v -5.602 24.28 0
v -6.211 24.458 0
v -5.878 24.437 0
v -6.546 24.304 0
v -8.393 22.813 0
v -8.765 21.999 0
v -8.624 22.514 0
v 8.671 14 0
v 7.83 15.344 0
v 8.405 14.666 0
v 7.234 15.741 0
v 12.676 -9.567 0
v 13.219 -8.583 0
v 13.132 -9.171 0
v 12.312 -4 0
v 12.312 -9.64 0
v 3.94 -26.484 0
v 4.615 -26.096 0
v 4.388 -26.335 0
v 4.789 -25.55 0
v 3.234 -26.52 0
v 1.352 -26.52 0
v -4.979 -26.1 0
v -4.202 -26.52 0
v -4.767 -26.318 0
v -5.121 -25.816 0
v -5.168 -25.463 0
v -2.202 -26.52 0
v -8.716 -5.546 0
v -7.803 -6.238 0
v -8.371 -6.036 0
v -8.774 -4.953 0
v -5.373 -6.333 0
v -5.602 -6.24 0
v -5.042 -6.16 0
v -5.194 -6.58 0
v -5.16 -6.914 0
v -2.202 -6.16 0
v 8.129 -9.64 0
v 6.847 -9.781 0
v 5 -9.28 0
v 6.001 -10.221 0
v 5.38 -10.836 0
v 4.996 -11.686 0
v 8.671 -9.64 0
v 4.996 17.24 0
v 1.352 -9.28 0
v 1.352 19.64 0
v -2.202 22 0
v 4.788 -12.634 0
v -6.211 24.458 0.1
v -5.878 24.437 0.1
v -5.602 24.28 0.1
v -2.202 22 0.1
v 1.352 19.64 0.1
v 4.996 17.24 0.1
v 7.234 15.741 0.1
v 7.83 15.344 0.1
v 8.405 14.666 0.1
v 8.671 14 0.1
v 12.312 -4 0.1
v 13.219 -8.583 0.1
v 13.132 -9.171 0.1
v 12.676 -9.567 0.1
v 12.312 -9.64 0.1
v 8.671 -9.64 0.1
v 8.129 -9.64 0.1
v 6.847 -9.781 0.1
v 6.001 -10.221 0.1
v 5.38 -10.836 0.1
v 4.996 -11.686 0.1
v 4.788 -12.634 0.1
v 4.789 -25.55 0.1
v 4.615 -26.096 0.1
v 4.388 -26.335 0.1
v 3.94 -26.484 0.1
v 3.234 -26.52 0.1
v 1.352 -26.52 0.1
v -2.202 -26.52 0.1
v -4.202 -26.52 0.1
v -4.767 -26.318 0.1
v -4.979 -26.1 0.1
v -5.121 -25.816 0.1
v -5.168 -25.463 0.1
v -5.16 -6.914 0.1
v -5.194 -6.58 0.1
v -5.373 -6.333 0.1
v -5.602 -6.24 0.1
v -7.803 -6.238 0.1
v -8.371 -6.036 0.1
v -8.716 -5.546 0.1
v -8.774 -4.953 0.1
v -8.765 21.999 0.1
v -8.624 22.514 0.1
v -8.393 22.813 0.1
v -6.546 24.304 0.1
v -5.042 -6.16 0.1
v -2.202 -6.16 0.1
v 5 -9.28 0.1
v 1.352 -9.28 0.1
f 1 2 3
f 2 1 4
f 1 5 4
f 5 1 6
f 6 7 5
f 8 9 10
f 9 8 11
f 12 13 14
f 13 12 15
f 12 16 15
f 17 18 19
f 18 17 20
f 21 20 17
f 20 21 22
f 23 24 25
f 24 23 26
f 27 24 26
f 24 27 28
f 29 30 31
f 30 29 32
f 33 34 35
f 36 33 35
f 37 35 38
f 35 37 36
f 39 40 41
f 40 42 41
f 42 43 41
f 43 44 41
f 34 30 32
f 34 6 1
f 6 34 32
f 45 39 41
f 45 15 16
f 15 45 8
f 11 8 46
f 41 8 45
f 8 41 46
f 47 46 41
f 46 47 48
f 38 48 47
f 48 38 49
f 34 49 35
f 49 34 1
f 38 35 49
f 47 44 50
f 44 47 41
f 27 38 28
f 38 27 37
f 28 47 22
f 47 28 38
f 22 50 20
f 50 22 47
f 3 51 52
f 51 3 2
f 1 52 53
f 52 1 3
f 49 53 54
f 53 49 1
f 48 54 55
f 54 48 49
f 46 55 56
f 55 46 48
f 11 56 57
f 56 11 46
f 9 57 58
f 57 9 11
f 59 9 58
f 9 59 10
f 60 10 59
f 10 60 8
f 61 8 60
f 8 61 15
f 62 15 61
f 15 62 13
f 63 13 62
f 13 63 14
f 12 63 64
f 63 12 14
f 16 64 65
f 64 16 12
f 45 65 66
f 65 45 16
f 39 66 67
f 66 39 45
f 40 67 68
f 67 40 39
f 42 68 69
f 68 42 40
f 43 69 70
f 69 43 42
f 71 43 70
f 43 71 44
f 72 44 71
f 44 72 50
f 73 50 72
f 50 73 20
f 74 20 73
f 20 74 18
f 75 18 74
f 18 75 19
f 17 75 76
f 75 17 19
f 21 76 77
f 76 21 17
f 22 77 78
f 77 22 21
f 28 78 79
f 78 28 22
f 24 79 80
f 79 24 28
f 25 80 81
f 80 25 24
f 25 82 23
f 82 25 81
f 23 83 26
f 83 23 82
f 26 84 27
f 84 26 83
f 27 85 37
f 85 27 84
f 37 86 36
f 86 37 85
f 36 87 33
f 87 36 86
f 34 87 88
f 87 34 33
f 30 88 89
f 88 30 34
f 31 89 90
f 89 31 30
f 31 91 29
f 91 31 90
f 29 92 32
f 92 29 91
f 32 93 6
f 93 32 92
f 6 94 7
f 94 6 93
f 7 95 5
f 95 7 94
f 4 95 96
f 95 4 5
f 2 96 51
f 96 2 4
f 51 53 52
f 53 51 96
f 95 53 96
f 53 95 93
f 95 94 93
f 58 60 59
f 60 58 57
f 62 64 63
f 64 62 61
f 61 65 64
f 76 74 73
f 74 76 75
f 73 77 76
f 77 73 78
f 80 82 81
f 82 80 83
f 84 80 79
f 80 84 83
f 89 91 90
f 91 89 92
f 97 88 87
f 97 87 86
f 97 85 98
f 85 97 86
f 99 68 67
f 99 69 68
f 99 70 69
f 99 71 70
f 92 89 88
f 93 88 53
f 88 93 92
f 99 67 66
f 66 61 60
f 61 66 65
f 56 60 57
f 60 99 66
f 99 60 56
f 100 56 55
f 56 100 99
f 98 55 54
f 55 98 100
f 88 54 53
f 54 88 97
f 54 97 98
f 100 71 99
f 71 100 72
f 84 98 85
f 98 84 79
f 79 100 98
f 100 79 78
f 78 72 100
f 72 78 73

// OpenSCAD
// file: ../p/4-4edge.scad
use <../lib.scad>
$fa=1; $fs=0.2;
function ldraw_lib__4_4edge(realsolid=false) = [
// 0 Circle 1.0
// 0 Name: 4-4edge.dat
// 0 Author: James Jessiman
// 0 !LDRAW_ORG Primitive UPDATE 2017-01
// 0 !LICENSE Licensed under CC BY 2.0 and CC BY 4.0 : see CAreadme.txt
// 
// 0 BFC CERTIFY CCW
  [0,"BFC","CERTIFY"],
  [0,"BFC","CCW"],
// 
// 0 !HISTORY 1998-12-15 [PTadmin] Official Update 1998-10
// 0 !HISTORY 2005-12-28 [PTadmin] Official Update 2005-01
// 0 !HISTORY 2007-06-24 [PTadmin] Header formatted for Contributor Agreement
// 0 !HISTORY 2008-07-01 [PTadmin] Official Update 2008-01
// 0 !HISTORY 2017-01-15 [Steffen] BFCed
// 0 !HISTORY 2017-12-30 [PTadmin] Official Update 2017-01
// 
// 
// 2 24 1 0 0 0.9239 0 0.3827
  [2,24,1,0,0,0.9239,0,0.3827],
// 2 24 0.9239 0 0.3827 0.7071 0 0.7071
  [2,24,0.9239,0,0.3827,0.7071,0,0.7071],
// 2 24 0.7071 0 0.7071 0.3827 0 0.9239
  [2,24,0.7071,0,0.7071,0.3827,0,0.9239],
// 2 24 0.3827 0 0.9239 0 0 1
  [2,24,0.3827,0,0.9239,0,0,1],
// 2 24 0 0 1 -0.3827 0 0.9239
  [2,24,0,0,1,-0.3827,0,0.9239],
// 2 24 -0.3827 0 0.9239 -0.7071 0 0.7071
  [2,24,-0.3827,0,0.9239,-0.7071,0,0.7071],
// 2 24 -0.7071 0 0.7071 -0.9239 0 0.3827
  [2,24,-0.7071,0,0.7071,-0.9239,0,0.3827],
// 2 24 -0.9239 0 0.3827 -1 0 -0
  [2,24,-0.9239,0,0.3827,-1,0,-0],
// 2 24 -1 0 -0 -0.9239 0 -0.3827
  [2,24,-1,0,-0,-0.9239,0,-0.3827],
// 2 24 -0.9239 0 -0.3827 -0.7071 0 -0.7071
  [2,24,-0.9239,0,-0.3827,-0.7071,0,-0.7071],
// 2 24 -0.7071 0 -0.7071 -0.3827 0 -0.9239
  [2,24,-0.7071,0,-0.7071,-0.3827,0,-0.9239],
// 2 24 -0.3827 0 -0.9239 0 0 -1
  [2,24,-0.3827,0,-0.9239,0,0,-1],
// 2 24 0 0 -1 0.3827 0 -0.9239
  [2,24,0,0,-1,0.3827,0,-0.9239],
// 2 24 0.3827 0 -0.9239 0.7071 0 -0.7071
  [2,24,0.3827,0,-0.9239,0.7071,0,-0.7071],
// 2 24 0.7071 0 -0.7071 0.9239 0 -0.3827
  [2,24,0.7071,0,-0.7071,0.9239,0,-0.3827],
// 2 24 0.9239 0 -0.3827 1 0 0
  [2,24,0.9239,0,-0.3827,1,0,0],
];
module ldraw_lib__4_4edge(step=0, col=false, unit=2/5, alt=false, line=0.2, solid=!$preview)
    makepoly(ldraw_lib__4_4edge(solid), step=step, col=col, unit=unit, alt=alt, line=line, solid=solid);
ldraw_lib__4_4edge(line=0.2);
// file: ../p/4-4disc.scad
use <../lib.scad>
$fa=1; $fs=0.2;
function ldraw_lib__4_4disc(realsolid=false) = [
// 0 Disc 1.0
// 0 Name: 4-4disc.dat
// 0 Author: James Jessiman
// 0 !LDRAW_ORG Primitive UPDATE 2002-02
// 0 !LICENSE Licensed under CC BY 2.0 and CC BY 4.0 : see CAreadme.txt
// 
// 0 BFC CERTIFY CCW
  [0,"BFC","CERTIFY"],
  [0,"BFC","CCW"],
// 
// 0 !HISTORY 1998-12-15 [PTadmin] Official Update 1998-10
// 0 !HISTORY 2002-03-23 [sbliss] Added BFC statement
// 0 !HISTORY 2002-04-25 [PTadmin] Official Update 2002-02
// 0 !HISTORY 2007-06-24 [PTadmin] Header formatted for Contributor Agreement
// 0 !HISTORY 2008-07-01 [PTadmin] Official Update 2008-01
// 
// 
// 3 16 0 0 0 1 0 0 0.9239 0 0.3827
  [3,16,0,0,0,1,0,0,0.9239,0,0.3827],
// 3 16 0 0 0 0.9239 0 0.3827 0.7071 0 0.7071
  [3,16,0,0,0,0.9239,0,0.3827,0.7071,0,0.7071],
// 3 16 0 0 0 0.7071 0 0.7071 0.3827 0 0.9239
  [3,16,0,0,0,0.7071,0,0.7071,0.3827,0,0.9239],
// 3 16 0 0 0 0.3827 0 0.9239 0 0 1
  [3,16,0,0,0,0.3827,0,0.9239,0,0,1],
// 3 16 0 0 0 0 0 1 -0.3827 0 0.9239
  [3,16,0,0,0,0,0,1,-0.3827,0,0.9239],
// 3 16 0 0 0 -0.3827 0 0.9239 -0.7071 0 0.7071
  [3,16,0,0,0,-0.3827,0,0.9239,-0.7071,0,0.7071],
// 3 16 0 0 0 -0.7071 0 0.7071 -0.9239 0 0.3827
  [3,16,0,0,0,-0.7071,0,0.7071,-0.9239,0,0.3827],
// 3 16 0 0 0 -0.9239 0 0.3827 -1 0 -0
  [3,16,0,0,0,-0.9239,0,0.3827,-1,0,-0],
// 3 16 0 0 0 -1 0 -0 -0.9239 0 -0.3827
  [3,16,0,0,0,-1,0,-0,-0.9239,0,-0.3827],
// 3 16 0 0 0 -0.9239 0 -0.3827 -0.7071 0 -0.7071
  [3,16,0,0,0,-0.9239,0,-0.3827,-0.7071,0,-0.7071],
// 3 16 0 0 0 -0.7071 0 -0.7071 -0.3827 0 -0.9239
  [3,16,0,0,0,-0.7071,0,-0.7071,-0.3827,0,-0.9239],
// 3 16 0 0 0 -0.3827 0 -0.9239 0 0 -1
  [3,16,0,0,0,-0.3827,0,-0.9239,0,0,-1],
// 3 16 0 0 0 0 0 -1 0.3827 0 -0.9239
  [3,16,0,0,0,0,0,-1,0.3827,0,-0.9239],
// 3 16 0 0 0 0.3827 0 -0.9239 0.7071 0 -0.7071
  [3,16,0,0,0,0.3827,0,-0.9239,0.7071,0,-0.7071],
// 3 16 0 0 0 0.7071 0 -0.7071 0.9239 0 -0.3827
  [3,16,0,0,0,0.7071,0,-0.7071,0.9239,0,-0.3827],
// 3 16 0 0 0 0.9239 0 -0.3827 1 0 0
  [3,16,0,0,0,0.9239,0,-0.3827,1,0,0],
// 0
];
module ldraw_lib__4_4disc(step=0, col=false, unit=2/5, alt=false, line=0.2, solid=!$preview)
    makepoly(ldraw_lib__4_4disc(solid), step=step, col=col, unit=unit, alt=alt, line=line, solid=solid);
ldraw_lib__4_4disc(line=0.2);
// file: ../p/4-4cyli.scad
use <../lib.scad>
$fa=1; $fs=0.2;
function ldraw_lib__4_4cyli(realsolid=false) = [
// 0 Cylinder 1.0
// 0 Name: 4-4cyli.dat
// 0 Author: James Jessiman
// 0 !LDRAW_ORG Primitive UPDATE 2005-01
// 0 !LICENSE Licensed under CC BY 2.0 and CC BY 4.0 : see CAreadme.txt
// 
// 0 BFC CERTIFY CCW
  [0,"BFC","CERTIFY"],
  [0,"BFC","CCW"],
// 
// 0 !HISTORY 1998-12-15 [PTadmin] Official Update 1998-10
// 0 !HISTORY 2002-03-23 [sbliss] Added BFC statement; merged headers from files in distributions LDraw 0.27 and Complete.
// 0 !HISTORY 2002-04-25 [PTadmin] Official Update 2002-02
// 0 !HISTORY 2004-12-14 [guyvivan] BFC CCW
// 0 !HISTORY 2005-12-28 [PTadmin] Official Update 2005-01
// 0 !HISTORY 2007-06-24 [PTadmin] Header formatted for Contributor Agreement
// 0 !HISTORY 2008-07-01 [PTadmin] Official Update 2008-01
// 
// 
// 4 16 1 1 0 0.9239 1 0.3827 0.9239 0 0.3827 1 0 0
  [4,16,1,1,0,0.9239,1,0.3827,0.9239,0,0.3827,1,0,0],
// 5 24 1 0 0 1 1 0 0.9239 0 0.3827 0.9239 0 -0.3827
  [5,24,1,0,0,1,1,0,0.9239,0,0.3827,0.9239,0,-0.3827],
// 4 16 0.9239 1 0.3827 0.7071 1 0.7071 0.7071 0 0.7071 0.9239 0 0.3827
  [4,16,0.9239,1,0.3827,0.7071,1,0.7071,0.7071,0,0.7071,0.9239,0,0.3827],
// 5 24 0.9239 0 0.3827 0.9239 1 0.3827 0.7071 0 0.7071 1 0 0
  [5,24,0.9239,0,0.3827,0.9239,1,0.3827,0.7071,0,0.7071,1,0,0],
// 4 16 0.7071 1 0.7071 0.3827 1 0.9239 0.3827 0 0.9239 0.7071 0 0.7071
  [4,16,0.7071,1,0.7071,0.3827,1,0.9239,0.3827,0,0.9239,0.7071,0,0.7071],
// 5 24 0.7071 0 0.7071 0.7071 1 0.7071 0.3827 0 0.9239 0.9239 0 0.3827
  [5,24,0.7071,0,0.7071,0.7071,1,0.7071,0.3827,0,0.9239,0.9239,0,0.3827],
// 4 16 0.3827 1 0.9239 0 1 1 0 0 1 0.3827 0 0.9239
  [4,16,0.3827,1,0.9239,0,1,1,0,0,1,0.3827,0,0.9239],
// 5 24 0.3827 0 0.9239 0.3827 1 0.9239 0 0 1 0.7071 0 0.7071
  [5,24,0.3827,0,0.9239,0.3827,1,0.9239,0,0,1,0.7071,0,0.7071],
// 4 16 0 1 1 -0.3827 1 0.9239 -0.3827 0 0.9239 0 0 1
  [4,16,0,1,1,-0.3827,1,0.9239,-0.3827,0,0.9239,0,0,1],
// 5 24 0 0 1 0 1 1 -0.3827 0 0.9239 0.3827 0 0.9239
  [5,24,0,0,1,0,1,1,-0.3827,0,0.9239,0.3827,0,0.9239],
// 4 16 -0.3827 1 0.9239 -0.7071 1 0.7071 -0.7071 0 0.7071 -0.3827 0 0.9239
  [4,16,-0.3827,1,0.9239,-0.7071,1,0.7071,-0.7071,0,0.7071,-0.3827,0,0.9239],
// 5 24 -0.3827 0 0.9239 -0.3827 1 0.9239 -0.7071 0 0.7071 0 0 1
  [5,24,-0.3827,0,0.9239,-0.3827,1,0.9239,-0.7071,0,0.7071,0,0,1],
// 4 16 -0.7071 1 0.7071 -0.9239 1 0.3827 -0.9239 0 0.3827 -0.7071 0 0.7071
  [4,16,-0.7071,1,0.7071,-0.9239,1,0.3827,-0.9239,0,0.3827,-0.7071,0,0.7071],
// 5 24 -0.7071 0 0.7071 -0.7071 1 0.7071 -0.9239 0 0.3827 -0.3827 0 0.9239
  [5,24,-0.7071,0,0.7071,-0.7071,1,0.7071,-0.9239,0,0.3827,-0.3827,0,0.9239],
// 4 16 -0.9239 1 0.3827 -1 1 0 -1 0 0 -0.9239 0 0.3827
  [4,16,-0.9239,1,0.3827,-1,1,0,-1,0,0,-0.9239,0,0.3827],
// 5 24 -0.9239 0 0.3827 -0.9239 1 0.3827 -1 0 0 -0.7071 0 0.7071
  [5,24,-0.9239,0,0.3827,-0.9239,1,0.3827,-1,0,0,-0.7071,0,0.7071],
// 4 16 -1 1 0 -0.9239 1 -0.3827 -0.9239 0 -0.3827 -1 0 0
  [4,16,-1,1,0,-0.9239,1,-0.3827,-0.9239,0,-0.3827,-1,0,0],
// 5 24 -1 0 0 -1 1 0 -0.9239 0 -0.3827 -0.9239 0 0.3827
  [5,24,-1,0,0,-1,1,0,-0.9239,0,-0.3827,-0.9239,0,0.3827],
// 4 16 -0.9239 1 -0.3827 -0.7071 1 -0.7071 -0.7071 0 -0.7071 -0.9239 0 -0.3827
  [4,16,-0.9239,1,-0.3827,-0.7071,1,-0.7071,-0.7071,0,-0.7071,-0.9239,0,-0.3827],
// 5 24 -0.9239 0 -0.3827 -0.9239 1 -0.3827 -0.7071 0 -0.7071 -1 0 0
  [5,24,-0.9239,0,-0.3827,-0.9239,1,-0.3827,-0.7071,0,-0.7071,-1,0,0],
// 4 16 -0.7071 1 -0.7071 -0.3827 1 -0.9239 -0.3827 0 -0.9239 -0.7071 0 -0.7071
  [4,16,-0.7071,1,-0.7071,-0.3827,1,-0.9239,-0.3827,0,-0.9239,-0.7071,0,-0.7071],
// 5 24 -0.7071 0 -0.7071 -0.7071 1 -0.7071 -0.3827 0 -0.9239 -0.9239 0 -0.3827
  [5,24,-0.7071,0,-0.7071,-0.7071,1,-0.7071,-0.3827,0,-0.9239,-0.9239,0,-0.3827],
// 4 16 -0.3827 1 -0.9239 0 1 -1 0 0 -1 -0.3827 0 -0.9239
  [4,16,-0.3827,1,-0.9239,0,1,-1,0,0,-1,-0.3827,0,-0.9239],
// 5 24 -0.3827 0 -0.9239 -0.3827 1 -0.9239 0 0 -1 -0.7071 0 -0.7071
  [5,24,-0.3827,0,-0.9239,-0.3827,1,-0.9239,0,0,-1,-0.7071,0,-0.7071],
// 4 16 0 1 -1 0.3827 1 -0.9239 0.3827 0 -0.9239 0 0 -1
  [4,16,0,1,-1,0.3827,1,-0.9239,0.3827,0,-0.9239,0,0,-1],
// 5 24 0 0 -1 0 1 -1 0.3827 0 -0.9239 -0.3827 0 -0.9239
  [5,24,0,0,-1,0,1,-1,0.3827,0,-0.9239,-0.3827,0,-0.9239],
// 4 16 0.3827 1 -0.9239 0.7071 1 -0.7071 0.7071 0 -0.7071 0.3827 0 -0.9239
  [4,16,0.3827,1,-0.9239,0.7071,1,-0.7071,0.7071,0,-0.7071,0.3827,0,-0.9239],
// 5 24 0.3827 0 -0.9239 0.3827 1 -0.9239 0.7071 0 -0.7071 0 0 -1
  [5,24,0.3827,0,-0.9239,0.3827,1,-0.9239,0.7071,0,-0.7071,0,0,-1],
// 4 16 0.7071 1 -0.7071 0.9239 1 -0.3827 0.9239 0 -0.3827 0.7071 0 -0.7071
  [4,16,0.7071,1,-0.7071,0.9239,1,-0.3827,0.9239,0,-0.3827,0.7071,0,-0.7071],
// 5 24 0.7071 0 -0.7071 0.7071 1 -0.7071 0.9239 0 -0.3827 0.3827 0 -0.9239
  [5,24,0.7071,0,-0.7071,0.7071,1,-0.7071,0.9239,0,-0.3827,0.3827,0,-0.9239],
// 4 16 0.9239 1 -0.3827 1 1 0 1 0 0 0.9239 0 -0.3827
  [4,16,0.9239,1,-0.3827,1,1,0,1,0,0,0.9239,0,-0.3827],
// 5 24 0.9239 0 -0.3827 0.9239 1 -0.3827 1 0 0 0.7071 0 -0.7071
  [5,24,0.9239,0,-0.3827,0.9239,1,-0.3827,1,0,0,0.7071,0,-0.7071],
// 0
];
module ldraw_lib__4_4cyli(step=0, col=false, unit=2/5, alt=false, line=0.2, solid=!$preview)
    makepoly(ldraw_lib__4_4cyli(solid), step=step, col=col, unit=unit, alt=alt, line=line, solid=solid);
ldraw_lib__4_4cyli(line=0.2);
// file: ../p/stud3.scad
use <../lib.scad>
use <4-4cyli.scad>
use <4-4disc.scad>
use <4-4edge.scad>
$fa=1; $fs=0.2;
function ldraw_lib__stud3(realsolid=false) = realsolid ? 
    [openscad(translate([0,0,-eps()], o=cylinder(4+eps(), r=4)),2)] : [
// 0 Stud Tube Solid
// 0 Name: stud3.dat
// 0 Author: James Jessiman
// 0 !LDRAW_ORG Primitive UPDATE 2012-01
// 0 !LICENSE Licensed under CC BY 2.0 and CC BY 4.0 : see CAreadme.txt
// 
// 0 BFC CERTIFY CCW
  [0,"BFC","CERTIFY"],
  [0,"BFC","CCW"],
// 
// 0 !HISTORY 2002-04-04 [sbliss] Modified for BFC compliance
// 0 !HISTORY 2002-04-25 [PTadmin] Official Update 2002-02
// 0 !HISTORY 2007-06-24 [PTadmin] Header formatted for Contributor Agreement
// 0 !HISTORY 2008-07-01 [PTadmin] Official Update 2008-01
// 0 !HISTORY 2012-02-16 [Philo] Changed to CCW
// 0 !HISTORY 2012-03-30 [PTadmin] Official Update 2012-01
// 
// 
// 1 16 0 -4 0 4 0 0 0 1 0 0 0 4 4-4edge.dat
  [1,16,0,-4,0,4,0,0,0,1,0,0,0,4, ldraw_lib__4_4edge(realsolid)],
// 1 16 0 0 0 4 0 0 0 1 0 0 0 4 4-4edge.dat
  [1,16,0,0,0,4,0,0,0,1,0,0,0,4, ldraw_lib__4_4edge(realsolid)],
// 1 16 0 -4 0 4 0 0 0 1 0 0 0 4 4-4disc.dat
  [1,16,0,-4,0,4,0,0,0,1,0,0,0,4, ldraw_lib__4_4disc(realsolid)],
// 1 16 0 -4 0 4 0 0 0 4 0 0 0 4 4-4cyli.dat
  [1,16,0,-4,0,4,0,0,0,4,0,0,0,4, ldraw_lib__4_4cyli(realsolid)],
];
module ldraw_lib__stud3(step=0, col=false, unit=2/5, alt=false, line=0.2, solid=!$preview)
    makepoly(ldraw_lib__stud3(solid), step=step, col=col, unit=unit, alt=alt, line=line, solid=solid);
ldraw_lib__stud3(line=0.2);
// file: ../p/stud.scad
use <../lib.scad>
use <4-4cyli.scad>
use <4-4disc.scad>
use <4-4edge.scad>
$fa=1; $fs=0.2;
function ldraw_lib__stud(realsolid=false) = realsolid ? 
    [openscad(translate([0,0,-eps()], o=cylinder(4+eps(), r=6)),2)] : [
// 0 Stud
// 0 Name: stud.dat
// 0 Author: James Jessiman
// 0 !LDRAW_ORG Primitive UPDATE 2012-01
// 0 !LICENSE Licensed under CC BY 2.0 and CC BY 4.0 : see CAreadme.txt
// 
// 0 BFC CERTIFY CCW
  [0,"BFC","CERTIFY"],
  [0,"BFC","CCW"],
// 
// 0 !HISTORY 2002-04-04 [sbliss] Modified for BFC compliance
// 0 !HISTORY 2002-04-25 [PTadmin] Official Update 2002-02
// 0 !HISTORY 2007-06-24 [PTadmin] Header formatted for Contributor Agreement
// 0 !HISTORY 2008-07-01 [PTadmin] Official Update 2008-01
// 0 !HISTORY 2012-02-16 [Philo] Changed to CCW
// 0 !HISTORY 2012-03-30 [PTadmin] Official Update 2012-01
// 
// 
// 1 16 0 0 0 6 0 0 0 1 0 0 0 6 4-4edge.dat
  [1,16,0,0,0,6,0,0,0,1,0,0,0,6, ldraw_lib__4_4edge(realsolid)],
// 1 16 0 -4 0 6 0 0 0 1 0 0 0 6 4-4edge.dat
  [1,16,0,-4,0,6,0,0,0,1,0,0,0,6, ldraw_lib__4_4edge(realsolid)],
// 1 16 0 0 0 6 0 0 0 -4 0 0 0 6 4-4cyli.dat
  [1,16,0,0,0,6,0,0,0,-4,0,0,0,6, ldraw_lib__4_4cyli(realsolid)],
// 1 16 0 -4 0 6 0 0 0 1 0 0 0 6 4-4disc.dat
  [1,16,0,-4,0,6,0,0,0,1,0,0,0,6, ldraw_lib__4_4disc(realsolid)],
];
module ldraw_lib__stud(step=0, col=false, unit=2/5, alt=false, line=0.2, solid=!$preview)
    makepoly(ldraw_lib__stud(solid), step=step, col=col, unit=unit, alt=alt, line=line, solid=solid);
ldraw_lib__stud(line=0.2);
// file: ../p/box5.scad
use <../lib.scad>
$fa=1; $fs=0.2;
function ldraw_lib__box5(realsolid=false) = [
// 0 Box with 5 Faces and All Edges
// 0 Name: box5.dat
// 0 Author: James Jessiman
// 0 !LDRAW_ORG Primitive UPDATE 2012-01
// 0 !LICENSE Licensed under CC BY 2.0 and CC BY 4.0 : see CAreadme.txt
// 
// 0 BFC CERTIFY CCW
  [0,"BFC","CERTIFY"],
  [0,"BFC","CCW"],
// 
// 0 !HISTORY 2002-04-03 [sbliss] Modified for BFC compliance
// 0 !HISTORY 2002-04-25 [PTadmin] Official Update 2002-02
// 0 !HISTORY 2007-06-24 [PTadmin] Header formatted for Contributor Agreement
// 0 !HISTORY 2008-07-01 [PTadmin] Official Update 2008-01
// 0 !HISTORY 2012-02-16 [Philo] Changed to CCW
// 0 !HISTORY 2012-03-30 [PTadmin] Official Update 2012-01
// 
// 
// 2 24 1 1 1 -1 1 1
  [2,24,1,1,1,-1,1,1],
// 2 24 -1 1 1 -1 1 -1
  [2,24,-1,1,1,-1,1,-1],
// 2 24 -1 1 -1 1 1 -1
  [2,24,-1,1,-1,1,1,-1],
// 2 24 1 1 -1 1 1 1
  [2,24,1,1,-1,1,1,1],
// 2 24 1 0 1 -1 0 1
  [2,24,1,0,1,-1,0,1],
// 2 24 -1 0 1 -1 0 -1
  [2,24,-1,0,1,-1,0,-1],
// 2 24 -1 0 -1 1 0 -1
  [2,24,-1,0,-1,1,0,-1],
// 2 24 1 0 -1 1 0 1
  [2,24,1,0,-1,1,0,1],
// 2 24 1 0 1 1 1 1
  [2,24,1,0,1,1,1,1],
// 2 24 -1 0 1 -1 1 1
  [2,24,-1,0,1,-1,1,1],
// 2 24 1 0 -1 1 1 -1
  [2,24,1,0,-1,1,1,-1],
// 2 24 -1 0 -1 -1 1 -1
  [2,24,-1,0,-1,-1,1,-1],
// 4 16 -1 1 1 1 1 1 1 1 -1 -1 1 -1
  [4,16,-1,1,1,1,1,1,1,1,-1,-1,1,-1],
// 4 16 -1 1 1 -1 0 1 1 0 1 1 1 1
  [4,16,-1,1,1,-1,0,1,1,0,1,1,1,1],
// 4 16 -1 1 -1 -1 0 -1 -1 0 1 -1 1 1
  [4,16,-1,1,-1,-1,0,-1,-1,0,1,-1,1,1],
// 4 16 1 1 -1 1 0 -1 -1 0 -1 -1 1 -1
  [4,16,1,1,-1,1,0,-1,-1,0,-1,-1,1,-1],
// 4 16 1 1 1 1 0 1 1 0 -1 1 1 -1
  [4,16,1,1,1,1,0,1,1,0,-1,1,1,-1],
];
module ldraw_lib__box5(step=0, col=false, unit=2/5, alt=false, line=0.2, solid=!$preview)
    makepoly(ldraw_lib__box5(solid), step=step, col=col, unit=unit, alt=alt, line=line, solid=solid);
ldraw_lib__box5(line=0.2);
// file: ../p/box4t.scad
use <../lib.scad>
$fa=1; $fs=0.2;
function ldraw_lib__box4t(realsolid=false) = [
// 0 Box with 4 Adjacent Faces and All Edges
// 0 Name: box4t.dat
// 0 Author: Tore Eriksson [Tore_Eriksson]
// 0 !LDRAW_ORG Primitive UPDATE 2003-02
// 0 !LICENSE Licensed under CC BY 2.0 and CC BY 4.0 : see CAreadme.txt
// 
// 0 BFC CERTIFY CCW
  [0,"BFC","CERTIFY"],
  [0,"BFC","CCW"],
// 
// 0 !HISTORY 1997-09-29 [PTadmin] Official Update 1997-15
// 0 !HISTORY 2002-08-31 [izanette] Modified with WINDZ for BFC compliance
// 0 !HISTORY 2003-08-01 [PTadmin] Official Update 2003-02
// 0 !HISTORY 2007-06-24 [PTadmin] Header formatted for Contributor Agreement
// 0 !HISTORY 2008-07-01 [PTadmin] Official Update 2008-01
// 
// 
// 2 24 1 1 1 -1 1 1
  [2,24,1,1,1,-1,1,1],
// 2 24 -1 1 1 -1 1 -1
  [2,24,-1,1,1,-1,1,-1],
// 2 24 -1 1 -1 1 1 -1
  [2,24,-1,1,-1,1,1,-1],
// 2 24 1 1 -1 1 1 1
  [2,24,1,1,-1,1,1,1],
// 2 24 1 0 1 -1 0 1
  [2,24,1,0,1,-1,0,1],
// 2 24 -1 0 1 -1 0 -1
  [2,24,-1,0,1,-1,0,-1],
// 2 24 -1 0 -1 1 0 -1
  [2,24,-1,0,-1,1,0,-1],
// 2 24 1 0 -1 1 0 1
  [2,24,1,0,-1,1,0,1],
// 2 24 1 0 1 1 1 1
  [2,24,1,0,1,1,1,1],
// 2 24 -1 0 1 -1 1 1
  [2,24,-1,0,1,-1,1,1],
// 2 24 1 0 -1 1 1 -1
  [2,24,1,0,-1,1,1,-1],
// 2 24 -1 0 -1 -1 1 -1
  [2,24,-1,0,-1,-1,1,-1],
// 4 16 1 1 1 1 1 -1 -1 1 -1 -1 1 1
  [4,16,1,1,1,1,1,-1,-1,1,-1,-1,1,1],
// 4 16 1 1 1 -1 1 1 -1 0 1 1 0 1
  [4,16,1,1,1,-1,1,1,-1,0,1,1,0,1],
// 4 16 -1 1 1 -1 1 -1 -1 0 -1 -1 0 1
  [4,16,-1,1,1,-1,1,-1,-1,0,-1,-1,0,1],
// 0 4 16 -1 1 -1 -1 0 -1 1 0 -1 1 1 -1
// 4 16 1 1 -1 1 1 1 1 0 1 1 0 -1
  [4,16,1,1,-1,1,1,1,1,0,1,1,0,-1],
// 0
];
module ldraw_lib__box4t(step=0, col=false, unit=2/5, alt=false, line=0.2, solid=!$preview)
    makepoly(ldraw_lib__box4t(solid), step=step, col=col, unit=unit, alt=alt, line=line, solid=solid);
ldraw_lib__box4t(line=0.2);
// file: s/3004s01.scad
use <../../lib.scad>
use <../../p/box4t.scad>
use <../../p/box5.scad>
use <../../p/stud.scad>
use <../../p/stud3.scad>
$fa=1; $fs=0.2;
function ldraw_lib__s__3004s01(realsolid=false) = [
// 0 ~Brick  1 x  2 without Front Face
// 0 Name: s\3004s01.dat
// 0 Author: James Jessiman
// 0 !LDRAW_ORG Subpart UPDATE 2003-03
// 0 !LICENSE Licensed under CC BY 2.0 and CC BY 4.0 : see CAreadme.txt
// 
// 0 BFC CERTIFY CCW
  [0,"BFC","CERTIFY"],
  [0,"BFC","CCW"],
// 
// 0 !HISTORY 2003-09-07 [jriley] Subfiling, BFC
// 0 !HISTORY 2003-12-19 [PTadmin] Official Update 2003-03
// 0 !HISTORY 2007-08-29 [PTadmin] Header formatted for Contributor Agreement
// 0 !HISTORY 2008-07-01 [PTadmin] Official Update 2008-01
// 
// 
// 1 16 0 4 0 1 0 0 0 -5 0 0 0 1 stud3.dat
  [1,16,0,4,0,1,0,0,0,-5,0,0,0,1, ldraw_lib__stud3(realsolid)],
// 0 BFC INVERTNEXT
  [0,"BFC","INVERTNEXT"],
// 1 16 0 24 0 16 0 0 0 -20 0 0 0 6 box5.dat
  [1,16,0,24,0,16,0,0,0,-20,0,0,0,6, ldraw_lib__box5(realsolid)],
// 4 16 20 24 10 16 24 6 -16 24 6 -20 24 10
  [4,16,20,24,10,16,24,6,-16,24,6,-20,24,10],
// 4 16 -20 24 10 -16 24 6 -16 24 -6 -20 24 -10
  [4,16,-20,24,10,-16,24,6,-16,24,-6,-20,24,-10],
// 4 16 -20 24 -10 -16 24 -6 16 24 -6 20 24 -10
  [4,16,-20,24,-10,-16,24,-6,16,24,-6,20,24,-10],
// 4 16 20 24 -10 16 24 -6 16 24 6 20 24 10
  [4,16,20,24,-10,16,24,-6,16,24,6,20,24,10],
// 1 16 0 24 0 20 0 0 0 -24 0 0 0 10 box4t.dat
  [1,16,0,24,0,20,0,0,0,-24,0,0,0,10, ldraw_lib__box4t(realsolid)],
// 1 16 10 0 0 1 0 0 0 1 0 0 0 1 stud.dat
  [1,16,10,0,0,1,0,0,0,1,0,0,0,1, ldraw_lib__stud(realsolid)],
// 1 16 -10 0 0 1 0 0 0 1 0 0 0 1 stud.dat
  [1,16,-10,0,0,1,0,0,0,1,0,0,0,1, ldraw_lib__stud(realsolid)],
// 0
];
module ldraw_lib__s__3004s01(step=0, col=false, unit=2/5, alt=false, line=0.2, solid=!$preview)
    makepoly(ldraw_lib__s__3004s01(solid), step=step, col=col, unit=unit, alt=alt, line=line, solid=solid);
ldraw_lib__s__3004s01(line=0.2);
// file: 3004.scad
use <../lib.scad>
use <s/3004s01.scad>
$fa=1; $fs=0.2;
function ldraw_lib__3004(realsolid=false) = [
// 0 Brick  1 x  2
// 0 Name: 3004.dat
// 0 Author: James Jessiman
// 0 !LDRAW_ORG Part UPDATE 2022-05
// 0 !LICENSE Licensed under CC BY 2.0 and CC BY 4.0 : see CAreadme.txt
// 
// 0 BFC CERTIFY CCW
  [0,"BFC","CERTIFY"],
  [0,"BFC","CCW"],
// 
// 0 !HISTORY 2001-10-26 [PTadmin] Official Update 2001-01
// 0 !HISTORY 2002-05-07 {unknown} BFC Certification
// 0 !HISTORY 2002-06-11 [PTadmin] Official Update 2002-03
// 0 !HISTORY 2007-05-07 [PTadmin] Header formatted for Contributor Agreement
// 0 !HISTORY 2008-07-01 [PTadmin] Official Update 2008-01
// 0 !HISTORY 2022-08-04 [MagFors] Using subfile
// 0 !HISTORY 2022-09-15 [PTadmin] Official Update 2022-05
// 
// 
// 1 16 0 0 0 1 0 0 0 1 0 0 0 1 s\3004s01.dat
  [1,16,0,0,0,1,0,0,0,1,0,0,0,1, ldraw_lib__s__3004s01(realsolid)],
// 4 16 -20 24 -10 20 24 -10 20 0 -10 -20 0 -10
  [4,16,-20,24,-10,20,24,-10,20,0,-10,-20,0,-10],
];
module ldraw_lib__3004(step=0, col=false, unit=2/5, alt=false, line=0.2, solid=!$preview)
    makepoly(ldraw_lib__3004(solid), step=step, col=col, unit=unit, alt=alt, line=line, solid=solid);
ldraw_lib__3004(line=0.2);
// file: s/13710as02.scad
use <../../lib.scad>
$fa=1; $fs=0.2;
function ldraw_lib__s__13710as02(realsolid=false) = [
// 0 ~Sticker Top for Technic Panel Fairing Smooth (Medium) Flat
// 0 Name: s\13710as02.dat
// 0 Author: Philippe Hurbain [Philo]
// 0 !LDRAW_ORG Subpart UPDATE 2022-02
// 0 !LICENSE Licensed under CC BY 2.0 and CC BY 4.0 : see CAreadme.txt
// 
// 0 BFC CERTIFY CCW
  [0,"BFC","CERTIFY"],
  [0,"BFC","CCW"],
// 
// 0 !HISTORY 2022-03-06 [PTadmin] Official Update 2022-02
// 
// 
// 0 // Top surface
// 4 16 16.364 -0.25 60.759 15.527 -0.25 61.145 14.695 -0.25 61.093 14.004 -0.25 60.7
  [4,16,16.364,-0.25,60.759,15.527,-0.25,61.145,14.695,-0.25,61.093,14.004,-0.25,60.7],
// 4 16 21.912 -0.25 54.998 20.983 -0.25 57.032 16.364 -0.25 60.759 14.004 -0.25 60.7
  [4,16,21.912,-0.25,54.998,20.983,-0.25,57.032,16.364,-0.25,60.759,14.004,-0.25,60.7],
// 3 16 21.912 -0.25 54.998 21.561 -0.25 56.284 20.983 -0.25 57.032
  [3,16,21.912,-0.25,54.998,21.561,-0.25,56.284,20.983,-0.25,57.032],
// 4 16 -18.084 -0.25 39.353 -19.575 -0.25 38.36 -21.013 -0.25 36.664 -21.677 -0.25 35
  [4,16,-18.084,-0.25,39.353,-19.575,-0.25,38.36,-21.013,-0.25,36.664,-21.677,-0.25,35],
// 4 16 -31.689 -0.25 -23.918 -30.78 -0.25 -10 -33.048 -0.25 -21.458 -32.83 -0.25 -22.928
  [4,16,-31.689,-0.25,-23.918,-30.78,-0.25,-10,-33.048,-0.25,-21.458,-32.83,-0.25,-22.928],
// 3 16 -31.689 -0.25 -23.918 -30.78 -0.25 -24.1 -30.78 -0.25 -10
  [3,16,-31.689,-0.25,-23.918,-30.78,-0.25,-24.1,-30.78,-0.25,-10],
// 4 16 -9.849 -0.25 -66.209 -11.972 -0.25 -63.874 -11.537 -0.25 -65.239 -10.971 -0.25 -65.837
  [4,16,-9.849,-0.25,-66.209,-11.972,-0.25,-63.874,-11.537,-0.25,-65.239,-10.971,-0.25,-65.837],
// 4 16 -3.379 -0.25 -66.3 -11.972 -0.25 -63.874 -9.849 -0.25 -66.209 -8.084 -0.25 -66.3
  [4,16,-3.379,-0.25,-66.3,-11.972,-0.25,-63.874,-9.849,-0.25,-66.209,-8.084,-0.25,-66.3],
// 4 16 12.802 -0.25 -64.539 10.504 -0.25 -66.3 11.917 -0.25 -65.795 12.448 -0.25 -65.249
  [4,16,12.802,-0.25,-64.539,10.504,-0.25,-66.3,11.917,-0.25,-65.795,12.448,-0.25,-65.249],
// 4 16 5.504 -0.25 -66.3 10.504 -0.25 -66.3 12.802 -0.25 -64.539 12.92 -0.25 -63.658
  [4,16,5.504,-0.25,-66.3,10.504,-0.25,-66.3,12.802,-0.25,-64.539,12.92,-0.25,-63.658],
// 4 16 19.507 -0.25 -15.595 20.928 -0.25 -15.089 21.79 -0.25 -13.866 21.935 -0.25 -12.382
  [4,16,19.507,-0.25,-15.595,20.928,-0.25,-15.089,21.79,-0.25,-13.866,21.935,-0.25,-12.382],
// 3 16 13.432 -0.25 -15.832 14.004 -0.25 -15.6 12.604 -0.25 -15.4
  [3,16,13.432,-0.25,-15.832,14.004,-0.25,-15.6,12.604,-0.25,-15.4],
// 3 16 12.984 -0.25 -16.45 13.432 -0.25 -15.832 12.604 -0.25 -15.4
  [3,16,12.984,-0.25,-16.45,13.432,-0.25,-15.832,12.604,-0.25,-15.4],
// 4 16 5.504 -0.25 -15.4 12.899 -0.25 -17.286 12.984 -0.25 -16.45 12.604 -0.25 -15.4
  [4,16,5.504,-0.25,-15.4,12.899,-0.25,-17.286,12.984,-0.25,-16.45,12.604,-0.25,-15.4],
// 3 16 -20.323 -0.25 -24.1 -17.118 -0.25 -24.453 -12.5 -0.25 -23.2
  [3,16,-20.323,-0.25,-24.1,-17.118,-0.25,-24.453,-12.5,-0.25,-23.2],
// 3 16 -17.118 -0.25 -24.453 -15.003 -0.25 -25.552 -12.5 -0.25 -23.2
  [3,16,-17.118,-0.25,-24.453,-15.003,-0.25,-25.552,-12.5,-0.25,-23.2],
// 3 16 -15.003 -0.25 -25.552 -13.45 -0.25 -27.089 -12.5 -0.25 -23.2
  [3,16,-15.003,-0.25,-25.552,-13.45,-0.25,-27.089,-12.5,-0.25,-23.2],
// 3 16 -13.45 -0.25 -27.089 -12.491 -0.25 -29.214 -12.5 -0.25 -23.2
  [3,16,-13.45,-0.25,-27.089,-12.491,-0.25,-29.214,-12.5,-0.25,-23.2],
// 3 16 14.004 -0.25 -15.6 19.507 -0.25 -15.595 21.935 -0.25 -12.382
  [3,16,14.004,-0.25,-15.6,19.507,-0.25,-15.595,21.935,-0.25,-12.382],
// 4 16 14.004 -0.25 60.7 14.004 -0.25 -15.6 21.935 -0.25 -12.382 21.912 -0.25 54.998
  [4,16,14.004,-0.25,60.7,14.004,-0.25,-15.6,21.935,-0.25,-12.382,21.912,-0.25,54.998],
// 3 16 -21.677 -0.25 -24.1 -20.323 -0.25 -24.1 -12.5 -0.25 -23.2
  [3,16,-21.677,-0.25,-24.1,-20.323,-0.25,-24.1,-12.5,-0.25,-23.2],
// 4 16 -30.78 -0.25 -24.1 -21.677 -0.25 -24.1 -21.677 -0.25 35 -30.78 -0.25 -10
  [4,16,-30.78,-0.25,-24.1,-21.677,-0.25,-24.1,-21.677,-0.25,35,-30.78,-0.25,-10],
// 3 16 -18.084 -0.25 39.353 -21.677 -0.25 35 -12.491 -0.25 43.1
  [3,16,-18.084,-0.25,39.353,-21.677,-0.25,35,-12.491,-0.25,43.1],
// 4 16 -21.677 -0.25 35 -21.677 -0.25 -24.1 -12.5 -0.25 -23.2 -12.491 -0.25 43.1
  [4,16,-21.677,-0.25,35,-21.677,-0.25,-24.1,-12.5,-0.25,-23.2,-12.491,-0.25,43.1],
// 4 16 -12.5 -0.25 -23.2 -3.379 -0.25 -23.2 -3.379 -0.25 49.1 -12.491 -0.25 43.1
  [4,16,-12.5,-0.25,-23.2,-3.379,-0.25,-23.2,-3.379,-0.25,49.1,-12.491,-0.25,43.1],
// 4 16 -3.379 -0.25 -23.2 5.504 -0.25 -15.4 5.504 -0.25 55 -3.379 -0.25 49.1
  [4,16,-3.379,-0.25,-23.2,5.504,-0.25,-15.4,5.504,-0.25,55,-3.379,-0.25,49.1],
// 4 16 14.004 -0.25 60.7 5.504 -0.25 55 12.604 -0.25 -15.4 14.004 -0.25 -15.6
  [4,16,14.004,-0.25,60.7,5.504,-0.25,55,12.604,-0.25,-15.4,14.004,-0.25,-15.6],
// 3 16 5.504 -0.25 -15.4 12.604 -0.25 -15.4 5.504 -0.25 55
  [3,16,5.504,-0.25,-15.4,12.604,-0.25,-15.4,5.504,-0.25,55],
// 4 16 -11.97 -0.25 -31.586 -3.379 -0.25 -23.2 -12.5 -0.25 -23.2 -12.491 -0.25 -29.214
  [4,16,-11.97,-0.25,-31.586,-3.379,-0.25,-23.2,-12.5,-0.25,-23.2,-12.491,-0.25,-29.214],
// 4 16 5.504 -0.25 -66.3 12.92 -0.25 -63.658 12.899 -0.25 -17.286 5.504 -0.25 -15.4
  [4,16,5.504,-0.25,-66.3,12.92,-0.25,-63.658,12.899,-0.25,-17.286,5.504,-0.25,-15.4],
// 4 16 -3.379 -0.25 -66.3 5.504 -0.25 -66.3 5.504 -0.25 -15.4 -3.379 -0.25 -23.2
  [4,16,-3.379,-0.25,-66.3,5.504,-0.25,-66.3,5.504,-0.25,-15.4,-3.379,-0.25,-23.2],
// 4 16 -11.972 -0.25 -63.874 -3.379 -0.25 -66.3 -3.379 -0.25 -23.2 -11.97 -0.25 -31.586
  [4,16,-11.972,-0.25,-63.874,-3.379,-0.25,-66.3,-3.379,-0.25,-23.2,-11.97,-0.25,-31.586],
];
module ldraw_lib__s__13710as02(step=0, col=false, unit=2/5, alt=false, line=0.2, solid=!$preview)
    makepoly(ldraw_lib__s__13710as02(solid), step=step, col=col, unit=unit, alt=alt, line=line, solid=solid);
ldraw_lib__s__13710as02(line=0.2);
// main file
use <../lib.scad>
use <s/13710as01.scad>
use <s/13710as02.scad>
$fa=1; $fs=0.2;
function ldraw_lib__13710b(realsolid=false) = [
// 0 Sticker Mindstorms EV3 #2 for Panel Smooth Medium (Needs Work)
// 0 Name: 13710b.dat
// 0 Author: Philippe Hurbain [Philo]
// 0 !LDRAW_ORG Part UPDATE 2022-02
// 0 !LICENSE Licensed under CC BY 2.0 and CC BY 4.0 : see CAreadme.txt
// 
// 0 !HELP To be used with panel 64391
// 
// 0 BFC CERTIFY CCW
  [0,"BFC","CERTIFY"],
  [0,"BFC","CCW"],
// 
// 0 !HISTORY 2022-03-06 [PTadmin] Official Update 2022-02
// 
// 
// 0 // Image file courtesy of the LEGO MINDSTORMS Team
// 0 // Needs Work: Missing more detailed fallback pattern
// 
// 1 16 0 0 0 -1 0 0 0 1 0 0 0 1 s\13710as01.dat
  [1,16,0,0,0,-1,0,0,0,1,0,0,0,1, ldraw_lib__s__13710as01(realsolid)],
// 0 !TEXMAP START PLANAR 33.048 0 61.145 33.048 0 -66.3 -21.935 0 61.145 13710b.png
// 0 !: 1 15 0 0 0 -1 0 0 0 1 0 0 0 1 s\13710as02.dat
// 0 !TEXMAP FALLBACK
// 1 15 0 0 0 -1 0 0 0 1 0 0 0 1 s\13710as02.dat
  [1,15,0,0,0,-1,0,0,0,1,0,0,0,1, ldraw_lib__s__13710as02(realsolid)],
// 0 !TEXMAP END
];
module ldraw_lib__13710b(step=0, col=false, unit=2/5, alt=false, line=0.2, solid=!$preview)
    makepoly(ldraw_lib__13710b(solid), step=step, col=col, unit=unit, alt=alt, line=line, solid=solid);
ldraw_lib__13710b(line=0.2);
